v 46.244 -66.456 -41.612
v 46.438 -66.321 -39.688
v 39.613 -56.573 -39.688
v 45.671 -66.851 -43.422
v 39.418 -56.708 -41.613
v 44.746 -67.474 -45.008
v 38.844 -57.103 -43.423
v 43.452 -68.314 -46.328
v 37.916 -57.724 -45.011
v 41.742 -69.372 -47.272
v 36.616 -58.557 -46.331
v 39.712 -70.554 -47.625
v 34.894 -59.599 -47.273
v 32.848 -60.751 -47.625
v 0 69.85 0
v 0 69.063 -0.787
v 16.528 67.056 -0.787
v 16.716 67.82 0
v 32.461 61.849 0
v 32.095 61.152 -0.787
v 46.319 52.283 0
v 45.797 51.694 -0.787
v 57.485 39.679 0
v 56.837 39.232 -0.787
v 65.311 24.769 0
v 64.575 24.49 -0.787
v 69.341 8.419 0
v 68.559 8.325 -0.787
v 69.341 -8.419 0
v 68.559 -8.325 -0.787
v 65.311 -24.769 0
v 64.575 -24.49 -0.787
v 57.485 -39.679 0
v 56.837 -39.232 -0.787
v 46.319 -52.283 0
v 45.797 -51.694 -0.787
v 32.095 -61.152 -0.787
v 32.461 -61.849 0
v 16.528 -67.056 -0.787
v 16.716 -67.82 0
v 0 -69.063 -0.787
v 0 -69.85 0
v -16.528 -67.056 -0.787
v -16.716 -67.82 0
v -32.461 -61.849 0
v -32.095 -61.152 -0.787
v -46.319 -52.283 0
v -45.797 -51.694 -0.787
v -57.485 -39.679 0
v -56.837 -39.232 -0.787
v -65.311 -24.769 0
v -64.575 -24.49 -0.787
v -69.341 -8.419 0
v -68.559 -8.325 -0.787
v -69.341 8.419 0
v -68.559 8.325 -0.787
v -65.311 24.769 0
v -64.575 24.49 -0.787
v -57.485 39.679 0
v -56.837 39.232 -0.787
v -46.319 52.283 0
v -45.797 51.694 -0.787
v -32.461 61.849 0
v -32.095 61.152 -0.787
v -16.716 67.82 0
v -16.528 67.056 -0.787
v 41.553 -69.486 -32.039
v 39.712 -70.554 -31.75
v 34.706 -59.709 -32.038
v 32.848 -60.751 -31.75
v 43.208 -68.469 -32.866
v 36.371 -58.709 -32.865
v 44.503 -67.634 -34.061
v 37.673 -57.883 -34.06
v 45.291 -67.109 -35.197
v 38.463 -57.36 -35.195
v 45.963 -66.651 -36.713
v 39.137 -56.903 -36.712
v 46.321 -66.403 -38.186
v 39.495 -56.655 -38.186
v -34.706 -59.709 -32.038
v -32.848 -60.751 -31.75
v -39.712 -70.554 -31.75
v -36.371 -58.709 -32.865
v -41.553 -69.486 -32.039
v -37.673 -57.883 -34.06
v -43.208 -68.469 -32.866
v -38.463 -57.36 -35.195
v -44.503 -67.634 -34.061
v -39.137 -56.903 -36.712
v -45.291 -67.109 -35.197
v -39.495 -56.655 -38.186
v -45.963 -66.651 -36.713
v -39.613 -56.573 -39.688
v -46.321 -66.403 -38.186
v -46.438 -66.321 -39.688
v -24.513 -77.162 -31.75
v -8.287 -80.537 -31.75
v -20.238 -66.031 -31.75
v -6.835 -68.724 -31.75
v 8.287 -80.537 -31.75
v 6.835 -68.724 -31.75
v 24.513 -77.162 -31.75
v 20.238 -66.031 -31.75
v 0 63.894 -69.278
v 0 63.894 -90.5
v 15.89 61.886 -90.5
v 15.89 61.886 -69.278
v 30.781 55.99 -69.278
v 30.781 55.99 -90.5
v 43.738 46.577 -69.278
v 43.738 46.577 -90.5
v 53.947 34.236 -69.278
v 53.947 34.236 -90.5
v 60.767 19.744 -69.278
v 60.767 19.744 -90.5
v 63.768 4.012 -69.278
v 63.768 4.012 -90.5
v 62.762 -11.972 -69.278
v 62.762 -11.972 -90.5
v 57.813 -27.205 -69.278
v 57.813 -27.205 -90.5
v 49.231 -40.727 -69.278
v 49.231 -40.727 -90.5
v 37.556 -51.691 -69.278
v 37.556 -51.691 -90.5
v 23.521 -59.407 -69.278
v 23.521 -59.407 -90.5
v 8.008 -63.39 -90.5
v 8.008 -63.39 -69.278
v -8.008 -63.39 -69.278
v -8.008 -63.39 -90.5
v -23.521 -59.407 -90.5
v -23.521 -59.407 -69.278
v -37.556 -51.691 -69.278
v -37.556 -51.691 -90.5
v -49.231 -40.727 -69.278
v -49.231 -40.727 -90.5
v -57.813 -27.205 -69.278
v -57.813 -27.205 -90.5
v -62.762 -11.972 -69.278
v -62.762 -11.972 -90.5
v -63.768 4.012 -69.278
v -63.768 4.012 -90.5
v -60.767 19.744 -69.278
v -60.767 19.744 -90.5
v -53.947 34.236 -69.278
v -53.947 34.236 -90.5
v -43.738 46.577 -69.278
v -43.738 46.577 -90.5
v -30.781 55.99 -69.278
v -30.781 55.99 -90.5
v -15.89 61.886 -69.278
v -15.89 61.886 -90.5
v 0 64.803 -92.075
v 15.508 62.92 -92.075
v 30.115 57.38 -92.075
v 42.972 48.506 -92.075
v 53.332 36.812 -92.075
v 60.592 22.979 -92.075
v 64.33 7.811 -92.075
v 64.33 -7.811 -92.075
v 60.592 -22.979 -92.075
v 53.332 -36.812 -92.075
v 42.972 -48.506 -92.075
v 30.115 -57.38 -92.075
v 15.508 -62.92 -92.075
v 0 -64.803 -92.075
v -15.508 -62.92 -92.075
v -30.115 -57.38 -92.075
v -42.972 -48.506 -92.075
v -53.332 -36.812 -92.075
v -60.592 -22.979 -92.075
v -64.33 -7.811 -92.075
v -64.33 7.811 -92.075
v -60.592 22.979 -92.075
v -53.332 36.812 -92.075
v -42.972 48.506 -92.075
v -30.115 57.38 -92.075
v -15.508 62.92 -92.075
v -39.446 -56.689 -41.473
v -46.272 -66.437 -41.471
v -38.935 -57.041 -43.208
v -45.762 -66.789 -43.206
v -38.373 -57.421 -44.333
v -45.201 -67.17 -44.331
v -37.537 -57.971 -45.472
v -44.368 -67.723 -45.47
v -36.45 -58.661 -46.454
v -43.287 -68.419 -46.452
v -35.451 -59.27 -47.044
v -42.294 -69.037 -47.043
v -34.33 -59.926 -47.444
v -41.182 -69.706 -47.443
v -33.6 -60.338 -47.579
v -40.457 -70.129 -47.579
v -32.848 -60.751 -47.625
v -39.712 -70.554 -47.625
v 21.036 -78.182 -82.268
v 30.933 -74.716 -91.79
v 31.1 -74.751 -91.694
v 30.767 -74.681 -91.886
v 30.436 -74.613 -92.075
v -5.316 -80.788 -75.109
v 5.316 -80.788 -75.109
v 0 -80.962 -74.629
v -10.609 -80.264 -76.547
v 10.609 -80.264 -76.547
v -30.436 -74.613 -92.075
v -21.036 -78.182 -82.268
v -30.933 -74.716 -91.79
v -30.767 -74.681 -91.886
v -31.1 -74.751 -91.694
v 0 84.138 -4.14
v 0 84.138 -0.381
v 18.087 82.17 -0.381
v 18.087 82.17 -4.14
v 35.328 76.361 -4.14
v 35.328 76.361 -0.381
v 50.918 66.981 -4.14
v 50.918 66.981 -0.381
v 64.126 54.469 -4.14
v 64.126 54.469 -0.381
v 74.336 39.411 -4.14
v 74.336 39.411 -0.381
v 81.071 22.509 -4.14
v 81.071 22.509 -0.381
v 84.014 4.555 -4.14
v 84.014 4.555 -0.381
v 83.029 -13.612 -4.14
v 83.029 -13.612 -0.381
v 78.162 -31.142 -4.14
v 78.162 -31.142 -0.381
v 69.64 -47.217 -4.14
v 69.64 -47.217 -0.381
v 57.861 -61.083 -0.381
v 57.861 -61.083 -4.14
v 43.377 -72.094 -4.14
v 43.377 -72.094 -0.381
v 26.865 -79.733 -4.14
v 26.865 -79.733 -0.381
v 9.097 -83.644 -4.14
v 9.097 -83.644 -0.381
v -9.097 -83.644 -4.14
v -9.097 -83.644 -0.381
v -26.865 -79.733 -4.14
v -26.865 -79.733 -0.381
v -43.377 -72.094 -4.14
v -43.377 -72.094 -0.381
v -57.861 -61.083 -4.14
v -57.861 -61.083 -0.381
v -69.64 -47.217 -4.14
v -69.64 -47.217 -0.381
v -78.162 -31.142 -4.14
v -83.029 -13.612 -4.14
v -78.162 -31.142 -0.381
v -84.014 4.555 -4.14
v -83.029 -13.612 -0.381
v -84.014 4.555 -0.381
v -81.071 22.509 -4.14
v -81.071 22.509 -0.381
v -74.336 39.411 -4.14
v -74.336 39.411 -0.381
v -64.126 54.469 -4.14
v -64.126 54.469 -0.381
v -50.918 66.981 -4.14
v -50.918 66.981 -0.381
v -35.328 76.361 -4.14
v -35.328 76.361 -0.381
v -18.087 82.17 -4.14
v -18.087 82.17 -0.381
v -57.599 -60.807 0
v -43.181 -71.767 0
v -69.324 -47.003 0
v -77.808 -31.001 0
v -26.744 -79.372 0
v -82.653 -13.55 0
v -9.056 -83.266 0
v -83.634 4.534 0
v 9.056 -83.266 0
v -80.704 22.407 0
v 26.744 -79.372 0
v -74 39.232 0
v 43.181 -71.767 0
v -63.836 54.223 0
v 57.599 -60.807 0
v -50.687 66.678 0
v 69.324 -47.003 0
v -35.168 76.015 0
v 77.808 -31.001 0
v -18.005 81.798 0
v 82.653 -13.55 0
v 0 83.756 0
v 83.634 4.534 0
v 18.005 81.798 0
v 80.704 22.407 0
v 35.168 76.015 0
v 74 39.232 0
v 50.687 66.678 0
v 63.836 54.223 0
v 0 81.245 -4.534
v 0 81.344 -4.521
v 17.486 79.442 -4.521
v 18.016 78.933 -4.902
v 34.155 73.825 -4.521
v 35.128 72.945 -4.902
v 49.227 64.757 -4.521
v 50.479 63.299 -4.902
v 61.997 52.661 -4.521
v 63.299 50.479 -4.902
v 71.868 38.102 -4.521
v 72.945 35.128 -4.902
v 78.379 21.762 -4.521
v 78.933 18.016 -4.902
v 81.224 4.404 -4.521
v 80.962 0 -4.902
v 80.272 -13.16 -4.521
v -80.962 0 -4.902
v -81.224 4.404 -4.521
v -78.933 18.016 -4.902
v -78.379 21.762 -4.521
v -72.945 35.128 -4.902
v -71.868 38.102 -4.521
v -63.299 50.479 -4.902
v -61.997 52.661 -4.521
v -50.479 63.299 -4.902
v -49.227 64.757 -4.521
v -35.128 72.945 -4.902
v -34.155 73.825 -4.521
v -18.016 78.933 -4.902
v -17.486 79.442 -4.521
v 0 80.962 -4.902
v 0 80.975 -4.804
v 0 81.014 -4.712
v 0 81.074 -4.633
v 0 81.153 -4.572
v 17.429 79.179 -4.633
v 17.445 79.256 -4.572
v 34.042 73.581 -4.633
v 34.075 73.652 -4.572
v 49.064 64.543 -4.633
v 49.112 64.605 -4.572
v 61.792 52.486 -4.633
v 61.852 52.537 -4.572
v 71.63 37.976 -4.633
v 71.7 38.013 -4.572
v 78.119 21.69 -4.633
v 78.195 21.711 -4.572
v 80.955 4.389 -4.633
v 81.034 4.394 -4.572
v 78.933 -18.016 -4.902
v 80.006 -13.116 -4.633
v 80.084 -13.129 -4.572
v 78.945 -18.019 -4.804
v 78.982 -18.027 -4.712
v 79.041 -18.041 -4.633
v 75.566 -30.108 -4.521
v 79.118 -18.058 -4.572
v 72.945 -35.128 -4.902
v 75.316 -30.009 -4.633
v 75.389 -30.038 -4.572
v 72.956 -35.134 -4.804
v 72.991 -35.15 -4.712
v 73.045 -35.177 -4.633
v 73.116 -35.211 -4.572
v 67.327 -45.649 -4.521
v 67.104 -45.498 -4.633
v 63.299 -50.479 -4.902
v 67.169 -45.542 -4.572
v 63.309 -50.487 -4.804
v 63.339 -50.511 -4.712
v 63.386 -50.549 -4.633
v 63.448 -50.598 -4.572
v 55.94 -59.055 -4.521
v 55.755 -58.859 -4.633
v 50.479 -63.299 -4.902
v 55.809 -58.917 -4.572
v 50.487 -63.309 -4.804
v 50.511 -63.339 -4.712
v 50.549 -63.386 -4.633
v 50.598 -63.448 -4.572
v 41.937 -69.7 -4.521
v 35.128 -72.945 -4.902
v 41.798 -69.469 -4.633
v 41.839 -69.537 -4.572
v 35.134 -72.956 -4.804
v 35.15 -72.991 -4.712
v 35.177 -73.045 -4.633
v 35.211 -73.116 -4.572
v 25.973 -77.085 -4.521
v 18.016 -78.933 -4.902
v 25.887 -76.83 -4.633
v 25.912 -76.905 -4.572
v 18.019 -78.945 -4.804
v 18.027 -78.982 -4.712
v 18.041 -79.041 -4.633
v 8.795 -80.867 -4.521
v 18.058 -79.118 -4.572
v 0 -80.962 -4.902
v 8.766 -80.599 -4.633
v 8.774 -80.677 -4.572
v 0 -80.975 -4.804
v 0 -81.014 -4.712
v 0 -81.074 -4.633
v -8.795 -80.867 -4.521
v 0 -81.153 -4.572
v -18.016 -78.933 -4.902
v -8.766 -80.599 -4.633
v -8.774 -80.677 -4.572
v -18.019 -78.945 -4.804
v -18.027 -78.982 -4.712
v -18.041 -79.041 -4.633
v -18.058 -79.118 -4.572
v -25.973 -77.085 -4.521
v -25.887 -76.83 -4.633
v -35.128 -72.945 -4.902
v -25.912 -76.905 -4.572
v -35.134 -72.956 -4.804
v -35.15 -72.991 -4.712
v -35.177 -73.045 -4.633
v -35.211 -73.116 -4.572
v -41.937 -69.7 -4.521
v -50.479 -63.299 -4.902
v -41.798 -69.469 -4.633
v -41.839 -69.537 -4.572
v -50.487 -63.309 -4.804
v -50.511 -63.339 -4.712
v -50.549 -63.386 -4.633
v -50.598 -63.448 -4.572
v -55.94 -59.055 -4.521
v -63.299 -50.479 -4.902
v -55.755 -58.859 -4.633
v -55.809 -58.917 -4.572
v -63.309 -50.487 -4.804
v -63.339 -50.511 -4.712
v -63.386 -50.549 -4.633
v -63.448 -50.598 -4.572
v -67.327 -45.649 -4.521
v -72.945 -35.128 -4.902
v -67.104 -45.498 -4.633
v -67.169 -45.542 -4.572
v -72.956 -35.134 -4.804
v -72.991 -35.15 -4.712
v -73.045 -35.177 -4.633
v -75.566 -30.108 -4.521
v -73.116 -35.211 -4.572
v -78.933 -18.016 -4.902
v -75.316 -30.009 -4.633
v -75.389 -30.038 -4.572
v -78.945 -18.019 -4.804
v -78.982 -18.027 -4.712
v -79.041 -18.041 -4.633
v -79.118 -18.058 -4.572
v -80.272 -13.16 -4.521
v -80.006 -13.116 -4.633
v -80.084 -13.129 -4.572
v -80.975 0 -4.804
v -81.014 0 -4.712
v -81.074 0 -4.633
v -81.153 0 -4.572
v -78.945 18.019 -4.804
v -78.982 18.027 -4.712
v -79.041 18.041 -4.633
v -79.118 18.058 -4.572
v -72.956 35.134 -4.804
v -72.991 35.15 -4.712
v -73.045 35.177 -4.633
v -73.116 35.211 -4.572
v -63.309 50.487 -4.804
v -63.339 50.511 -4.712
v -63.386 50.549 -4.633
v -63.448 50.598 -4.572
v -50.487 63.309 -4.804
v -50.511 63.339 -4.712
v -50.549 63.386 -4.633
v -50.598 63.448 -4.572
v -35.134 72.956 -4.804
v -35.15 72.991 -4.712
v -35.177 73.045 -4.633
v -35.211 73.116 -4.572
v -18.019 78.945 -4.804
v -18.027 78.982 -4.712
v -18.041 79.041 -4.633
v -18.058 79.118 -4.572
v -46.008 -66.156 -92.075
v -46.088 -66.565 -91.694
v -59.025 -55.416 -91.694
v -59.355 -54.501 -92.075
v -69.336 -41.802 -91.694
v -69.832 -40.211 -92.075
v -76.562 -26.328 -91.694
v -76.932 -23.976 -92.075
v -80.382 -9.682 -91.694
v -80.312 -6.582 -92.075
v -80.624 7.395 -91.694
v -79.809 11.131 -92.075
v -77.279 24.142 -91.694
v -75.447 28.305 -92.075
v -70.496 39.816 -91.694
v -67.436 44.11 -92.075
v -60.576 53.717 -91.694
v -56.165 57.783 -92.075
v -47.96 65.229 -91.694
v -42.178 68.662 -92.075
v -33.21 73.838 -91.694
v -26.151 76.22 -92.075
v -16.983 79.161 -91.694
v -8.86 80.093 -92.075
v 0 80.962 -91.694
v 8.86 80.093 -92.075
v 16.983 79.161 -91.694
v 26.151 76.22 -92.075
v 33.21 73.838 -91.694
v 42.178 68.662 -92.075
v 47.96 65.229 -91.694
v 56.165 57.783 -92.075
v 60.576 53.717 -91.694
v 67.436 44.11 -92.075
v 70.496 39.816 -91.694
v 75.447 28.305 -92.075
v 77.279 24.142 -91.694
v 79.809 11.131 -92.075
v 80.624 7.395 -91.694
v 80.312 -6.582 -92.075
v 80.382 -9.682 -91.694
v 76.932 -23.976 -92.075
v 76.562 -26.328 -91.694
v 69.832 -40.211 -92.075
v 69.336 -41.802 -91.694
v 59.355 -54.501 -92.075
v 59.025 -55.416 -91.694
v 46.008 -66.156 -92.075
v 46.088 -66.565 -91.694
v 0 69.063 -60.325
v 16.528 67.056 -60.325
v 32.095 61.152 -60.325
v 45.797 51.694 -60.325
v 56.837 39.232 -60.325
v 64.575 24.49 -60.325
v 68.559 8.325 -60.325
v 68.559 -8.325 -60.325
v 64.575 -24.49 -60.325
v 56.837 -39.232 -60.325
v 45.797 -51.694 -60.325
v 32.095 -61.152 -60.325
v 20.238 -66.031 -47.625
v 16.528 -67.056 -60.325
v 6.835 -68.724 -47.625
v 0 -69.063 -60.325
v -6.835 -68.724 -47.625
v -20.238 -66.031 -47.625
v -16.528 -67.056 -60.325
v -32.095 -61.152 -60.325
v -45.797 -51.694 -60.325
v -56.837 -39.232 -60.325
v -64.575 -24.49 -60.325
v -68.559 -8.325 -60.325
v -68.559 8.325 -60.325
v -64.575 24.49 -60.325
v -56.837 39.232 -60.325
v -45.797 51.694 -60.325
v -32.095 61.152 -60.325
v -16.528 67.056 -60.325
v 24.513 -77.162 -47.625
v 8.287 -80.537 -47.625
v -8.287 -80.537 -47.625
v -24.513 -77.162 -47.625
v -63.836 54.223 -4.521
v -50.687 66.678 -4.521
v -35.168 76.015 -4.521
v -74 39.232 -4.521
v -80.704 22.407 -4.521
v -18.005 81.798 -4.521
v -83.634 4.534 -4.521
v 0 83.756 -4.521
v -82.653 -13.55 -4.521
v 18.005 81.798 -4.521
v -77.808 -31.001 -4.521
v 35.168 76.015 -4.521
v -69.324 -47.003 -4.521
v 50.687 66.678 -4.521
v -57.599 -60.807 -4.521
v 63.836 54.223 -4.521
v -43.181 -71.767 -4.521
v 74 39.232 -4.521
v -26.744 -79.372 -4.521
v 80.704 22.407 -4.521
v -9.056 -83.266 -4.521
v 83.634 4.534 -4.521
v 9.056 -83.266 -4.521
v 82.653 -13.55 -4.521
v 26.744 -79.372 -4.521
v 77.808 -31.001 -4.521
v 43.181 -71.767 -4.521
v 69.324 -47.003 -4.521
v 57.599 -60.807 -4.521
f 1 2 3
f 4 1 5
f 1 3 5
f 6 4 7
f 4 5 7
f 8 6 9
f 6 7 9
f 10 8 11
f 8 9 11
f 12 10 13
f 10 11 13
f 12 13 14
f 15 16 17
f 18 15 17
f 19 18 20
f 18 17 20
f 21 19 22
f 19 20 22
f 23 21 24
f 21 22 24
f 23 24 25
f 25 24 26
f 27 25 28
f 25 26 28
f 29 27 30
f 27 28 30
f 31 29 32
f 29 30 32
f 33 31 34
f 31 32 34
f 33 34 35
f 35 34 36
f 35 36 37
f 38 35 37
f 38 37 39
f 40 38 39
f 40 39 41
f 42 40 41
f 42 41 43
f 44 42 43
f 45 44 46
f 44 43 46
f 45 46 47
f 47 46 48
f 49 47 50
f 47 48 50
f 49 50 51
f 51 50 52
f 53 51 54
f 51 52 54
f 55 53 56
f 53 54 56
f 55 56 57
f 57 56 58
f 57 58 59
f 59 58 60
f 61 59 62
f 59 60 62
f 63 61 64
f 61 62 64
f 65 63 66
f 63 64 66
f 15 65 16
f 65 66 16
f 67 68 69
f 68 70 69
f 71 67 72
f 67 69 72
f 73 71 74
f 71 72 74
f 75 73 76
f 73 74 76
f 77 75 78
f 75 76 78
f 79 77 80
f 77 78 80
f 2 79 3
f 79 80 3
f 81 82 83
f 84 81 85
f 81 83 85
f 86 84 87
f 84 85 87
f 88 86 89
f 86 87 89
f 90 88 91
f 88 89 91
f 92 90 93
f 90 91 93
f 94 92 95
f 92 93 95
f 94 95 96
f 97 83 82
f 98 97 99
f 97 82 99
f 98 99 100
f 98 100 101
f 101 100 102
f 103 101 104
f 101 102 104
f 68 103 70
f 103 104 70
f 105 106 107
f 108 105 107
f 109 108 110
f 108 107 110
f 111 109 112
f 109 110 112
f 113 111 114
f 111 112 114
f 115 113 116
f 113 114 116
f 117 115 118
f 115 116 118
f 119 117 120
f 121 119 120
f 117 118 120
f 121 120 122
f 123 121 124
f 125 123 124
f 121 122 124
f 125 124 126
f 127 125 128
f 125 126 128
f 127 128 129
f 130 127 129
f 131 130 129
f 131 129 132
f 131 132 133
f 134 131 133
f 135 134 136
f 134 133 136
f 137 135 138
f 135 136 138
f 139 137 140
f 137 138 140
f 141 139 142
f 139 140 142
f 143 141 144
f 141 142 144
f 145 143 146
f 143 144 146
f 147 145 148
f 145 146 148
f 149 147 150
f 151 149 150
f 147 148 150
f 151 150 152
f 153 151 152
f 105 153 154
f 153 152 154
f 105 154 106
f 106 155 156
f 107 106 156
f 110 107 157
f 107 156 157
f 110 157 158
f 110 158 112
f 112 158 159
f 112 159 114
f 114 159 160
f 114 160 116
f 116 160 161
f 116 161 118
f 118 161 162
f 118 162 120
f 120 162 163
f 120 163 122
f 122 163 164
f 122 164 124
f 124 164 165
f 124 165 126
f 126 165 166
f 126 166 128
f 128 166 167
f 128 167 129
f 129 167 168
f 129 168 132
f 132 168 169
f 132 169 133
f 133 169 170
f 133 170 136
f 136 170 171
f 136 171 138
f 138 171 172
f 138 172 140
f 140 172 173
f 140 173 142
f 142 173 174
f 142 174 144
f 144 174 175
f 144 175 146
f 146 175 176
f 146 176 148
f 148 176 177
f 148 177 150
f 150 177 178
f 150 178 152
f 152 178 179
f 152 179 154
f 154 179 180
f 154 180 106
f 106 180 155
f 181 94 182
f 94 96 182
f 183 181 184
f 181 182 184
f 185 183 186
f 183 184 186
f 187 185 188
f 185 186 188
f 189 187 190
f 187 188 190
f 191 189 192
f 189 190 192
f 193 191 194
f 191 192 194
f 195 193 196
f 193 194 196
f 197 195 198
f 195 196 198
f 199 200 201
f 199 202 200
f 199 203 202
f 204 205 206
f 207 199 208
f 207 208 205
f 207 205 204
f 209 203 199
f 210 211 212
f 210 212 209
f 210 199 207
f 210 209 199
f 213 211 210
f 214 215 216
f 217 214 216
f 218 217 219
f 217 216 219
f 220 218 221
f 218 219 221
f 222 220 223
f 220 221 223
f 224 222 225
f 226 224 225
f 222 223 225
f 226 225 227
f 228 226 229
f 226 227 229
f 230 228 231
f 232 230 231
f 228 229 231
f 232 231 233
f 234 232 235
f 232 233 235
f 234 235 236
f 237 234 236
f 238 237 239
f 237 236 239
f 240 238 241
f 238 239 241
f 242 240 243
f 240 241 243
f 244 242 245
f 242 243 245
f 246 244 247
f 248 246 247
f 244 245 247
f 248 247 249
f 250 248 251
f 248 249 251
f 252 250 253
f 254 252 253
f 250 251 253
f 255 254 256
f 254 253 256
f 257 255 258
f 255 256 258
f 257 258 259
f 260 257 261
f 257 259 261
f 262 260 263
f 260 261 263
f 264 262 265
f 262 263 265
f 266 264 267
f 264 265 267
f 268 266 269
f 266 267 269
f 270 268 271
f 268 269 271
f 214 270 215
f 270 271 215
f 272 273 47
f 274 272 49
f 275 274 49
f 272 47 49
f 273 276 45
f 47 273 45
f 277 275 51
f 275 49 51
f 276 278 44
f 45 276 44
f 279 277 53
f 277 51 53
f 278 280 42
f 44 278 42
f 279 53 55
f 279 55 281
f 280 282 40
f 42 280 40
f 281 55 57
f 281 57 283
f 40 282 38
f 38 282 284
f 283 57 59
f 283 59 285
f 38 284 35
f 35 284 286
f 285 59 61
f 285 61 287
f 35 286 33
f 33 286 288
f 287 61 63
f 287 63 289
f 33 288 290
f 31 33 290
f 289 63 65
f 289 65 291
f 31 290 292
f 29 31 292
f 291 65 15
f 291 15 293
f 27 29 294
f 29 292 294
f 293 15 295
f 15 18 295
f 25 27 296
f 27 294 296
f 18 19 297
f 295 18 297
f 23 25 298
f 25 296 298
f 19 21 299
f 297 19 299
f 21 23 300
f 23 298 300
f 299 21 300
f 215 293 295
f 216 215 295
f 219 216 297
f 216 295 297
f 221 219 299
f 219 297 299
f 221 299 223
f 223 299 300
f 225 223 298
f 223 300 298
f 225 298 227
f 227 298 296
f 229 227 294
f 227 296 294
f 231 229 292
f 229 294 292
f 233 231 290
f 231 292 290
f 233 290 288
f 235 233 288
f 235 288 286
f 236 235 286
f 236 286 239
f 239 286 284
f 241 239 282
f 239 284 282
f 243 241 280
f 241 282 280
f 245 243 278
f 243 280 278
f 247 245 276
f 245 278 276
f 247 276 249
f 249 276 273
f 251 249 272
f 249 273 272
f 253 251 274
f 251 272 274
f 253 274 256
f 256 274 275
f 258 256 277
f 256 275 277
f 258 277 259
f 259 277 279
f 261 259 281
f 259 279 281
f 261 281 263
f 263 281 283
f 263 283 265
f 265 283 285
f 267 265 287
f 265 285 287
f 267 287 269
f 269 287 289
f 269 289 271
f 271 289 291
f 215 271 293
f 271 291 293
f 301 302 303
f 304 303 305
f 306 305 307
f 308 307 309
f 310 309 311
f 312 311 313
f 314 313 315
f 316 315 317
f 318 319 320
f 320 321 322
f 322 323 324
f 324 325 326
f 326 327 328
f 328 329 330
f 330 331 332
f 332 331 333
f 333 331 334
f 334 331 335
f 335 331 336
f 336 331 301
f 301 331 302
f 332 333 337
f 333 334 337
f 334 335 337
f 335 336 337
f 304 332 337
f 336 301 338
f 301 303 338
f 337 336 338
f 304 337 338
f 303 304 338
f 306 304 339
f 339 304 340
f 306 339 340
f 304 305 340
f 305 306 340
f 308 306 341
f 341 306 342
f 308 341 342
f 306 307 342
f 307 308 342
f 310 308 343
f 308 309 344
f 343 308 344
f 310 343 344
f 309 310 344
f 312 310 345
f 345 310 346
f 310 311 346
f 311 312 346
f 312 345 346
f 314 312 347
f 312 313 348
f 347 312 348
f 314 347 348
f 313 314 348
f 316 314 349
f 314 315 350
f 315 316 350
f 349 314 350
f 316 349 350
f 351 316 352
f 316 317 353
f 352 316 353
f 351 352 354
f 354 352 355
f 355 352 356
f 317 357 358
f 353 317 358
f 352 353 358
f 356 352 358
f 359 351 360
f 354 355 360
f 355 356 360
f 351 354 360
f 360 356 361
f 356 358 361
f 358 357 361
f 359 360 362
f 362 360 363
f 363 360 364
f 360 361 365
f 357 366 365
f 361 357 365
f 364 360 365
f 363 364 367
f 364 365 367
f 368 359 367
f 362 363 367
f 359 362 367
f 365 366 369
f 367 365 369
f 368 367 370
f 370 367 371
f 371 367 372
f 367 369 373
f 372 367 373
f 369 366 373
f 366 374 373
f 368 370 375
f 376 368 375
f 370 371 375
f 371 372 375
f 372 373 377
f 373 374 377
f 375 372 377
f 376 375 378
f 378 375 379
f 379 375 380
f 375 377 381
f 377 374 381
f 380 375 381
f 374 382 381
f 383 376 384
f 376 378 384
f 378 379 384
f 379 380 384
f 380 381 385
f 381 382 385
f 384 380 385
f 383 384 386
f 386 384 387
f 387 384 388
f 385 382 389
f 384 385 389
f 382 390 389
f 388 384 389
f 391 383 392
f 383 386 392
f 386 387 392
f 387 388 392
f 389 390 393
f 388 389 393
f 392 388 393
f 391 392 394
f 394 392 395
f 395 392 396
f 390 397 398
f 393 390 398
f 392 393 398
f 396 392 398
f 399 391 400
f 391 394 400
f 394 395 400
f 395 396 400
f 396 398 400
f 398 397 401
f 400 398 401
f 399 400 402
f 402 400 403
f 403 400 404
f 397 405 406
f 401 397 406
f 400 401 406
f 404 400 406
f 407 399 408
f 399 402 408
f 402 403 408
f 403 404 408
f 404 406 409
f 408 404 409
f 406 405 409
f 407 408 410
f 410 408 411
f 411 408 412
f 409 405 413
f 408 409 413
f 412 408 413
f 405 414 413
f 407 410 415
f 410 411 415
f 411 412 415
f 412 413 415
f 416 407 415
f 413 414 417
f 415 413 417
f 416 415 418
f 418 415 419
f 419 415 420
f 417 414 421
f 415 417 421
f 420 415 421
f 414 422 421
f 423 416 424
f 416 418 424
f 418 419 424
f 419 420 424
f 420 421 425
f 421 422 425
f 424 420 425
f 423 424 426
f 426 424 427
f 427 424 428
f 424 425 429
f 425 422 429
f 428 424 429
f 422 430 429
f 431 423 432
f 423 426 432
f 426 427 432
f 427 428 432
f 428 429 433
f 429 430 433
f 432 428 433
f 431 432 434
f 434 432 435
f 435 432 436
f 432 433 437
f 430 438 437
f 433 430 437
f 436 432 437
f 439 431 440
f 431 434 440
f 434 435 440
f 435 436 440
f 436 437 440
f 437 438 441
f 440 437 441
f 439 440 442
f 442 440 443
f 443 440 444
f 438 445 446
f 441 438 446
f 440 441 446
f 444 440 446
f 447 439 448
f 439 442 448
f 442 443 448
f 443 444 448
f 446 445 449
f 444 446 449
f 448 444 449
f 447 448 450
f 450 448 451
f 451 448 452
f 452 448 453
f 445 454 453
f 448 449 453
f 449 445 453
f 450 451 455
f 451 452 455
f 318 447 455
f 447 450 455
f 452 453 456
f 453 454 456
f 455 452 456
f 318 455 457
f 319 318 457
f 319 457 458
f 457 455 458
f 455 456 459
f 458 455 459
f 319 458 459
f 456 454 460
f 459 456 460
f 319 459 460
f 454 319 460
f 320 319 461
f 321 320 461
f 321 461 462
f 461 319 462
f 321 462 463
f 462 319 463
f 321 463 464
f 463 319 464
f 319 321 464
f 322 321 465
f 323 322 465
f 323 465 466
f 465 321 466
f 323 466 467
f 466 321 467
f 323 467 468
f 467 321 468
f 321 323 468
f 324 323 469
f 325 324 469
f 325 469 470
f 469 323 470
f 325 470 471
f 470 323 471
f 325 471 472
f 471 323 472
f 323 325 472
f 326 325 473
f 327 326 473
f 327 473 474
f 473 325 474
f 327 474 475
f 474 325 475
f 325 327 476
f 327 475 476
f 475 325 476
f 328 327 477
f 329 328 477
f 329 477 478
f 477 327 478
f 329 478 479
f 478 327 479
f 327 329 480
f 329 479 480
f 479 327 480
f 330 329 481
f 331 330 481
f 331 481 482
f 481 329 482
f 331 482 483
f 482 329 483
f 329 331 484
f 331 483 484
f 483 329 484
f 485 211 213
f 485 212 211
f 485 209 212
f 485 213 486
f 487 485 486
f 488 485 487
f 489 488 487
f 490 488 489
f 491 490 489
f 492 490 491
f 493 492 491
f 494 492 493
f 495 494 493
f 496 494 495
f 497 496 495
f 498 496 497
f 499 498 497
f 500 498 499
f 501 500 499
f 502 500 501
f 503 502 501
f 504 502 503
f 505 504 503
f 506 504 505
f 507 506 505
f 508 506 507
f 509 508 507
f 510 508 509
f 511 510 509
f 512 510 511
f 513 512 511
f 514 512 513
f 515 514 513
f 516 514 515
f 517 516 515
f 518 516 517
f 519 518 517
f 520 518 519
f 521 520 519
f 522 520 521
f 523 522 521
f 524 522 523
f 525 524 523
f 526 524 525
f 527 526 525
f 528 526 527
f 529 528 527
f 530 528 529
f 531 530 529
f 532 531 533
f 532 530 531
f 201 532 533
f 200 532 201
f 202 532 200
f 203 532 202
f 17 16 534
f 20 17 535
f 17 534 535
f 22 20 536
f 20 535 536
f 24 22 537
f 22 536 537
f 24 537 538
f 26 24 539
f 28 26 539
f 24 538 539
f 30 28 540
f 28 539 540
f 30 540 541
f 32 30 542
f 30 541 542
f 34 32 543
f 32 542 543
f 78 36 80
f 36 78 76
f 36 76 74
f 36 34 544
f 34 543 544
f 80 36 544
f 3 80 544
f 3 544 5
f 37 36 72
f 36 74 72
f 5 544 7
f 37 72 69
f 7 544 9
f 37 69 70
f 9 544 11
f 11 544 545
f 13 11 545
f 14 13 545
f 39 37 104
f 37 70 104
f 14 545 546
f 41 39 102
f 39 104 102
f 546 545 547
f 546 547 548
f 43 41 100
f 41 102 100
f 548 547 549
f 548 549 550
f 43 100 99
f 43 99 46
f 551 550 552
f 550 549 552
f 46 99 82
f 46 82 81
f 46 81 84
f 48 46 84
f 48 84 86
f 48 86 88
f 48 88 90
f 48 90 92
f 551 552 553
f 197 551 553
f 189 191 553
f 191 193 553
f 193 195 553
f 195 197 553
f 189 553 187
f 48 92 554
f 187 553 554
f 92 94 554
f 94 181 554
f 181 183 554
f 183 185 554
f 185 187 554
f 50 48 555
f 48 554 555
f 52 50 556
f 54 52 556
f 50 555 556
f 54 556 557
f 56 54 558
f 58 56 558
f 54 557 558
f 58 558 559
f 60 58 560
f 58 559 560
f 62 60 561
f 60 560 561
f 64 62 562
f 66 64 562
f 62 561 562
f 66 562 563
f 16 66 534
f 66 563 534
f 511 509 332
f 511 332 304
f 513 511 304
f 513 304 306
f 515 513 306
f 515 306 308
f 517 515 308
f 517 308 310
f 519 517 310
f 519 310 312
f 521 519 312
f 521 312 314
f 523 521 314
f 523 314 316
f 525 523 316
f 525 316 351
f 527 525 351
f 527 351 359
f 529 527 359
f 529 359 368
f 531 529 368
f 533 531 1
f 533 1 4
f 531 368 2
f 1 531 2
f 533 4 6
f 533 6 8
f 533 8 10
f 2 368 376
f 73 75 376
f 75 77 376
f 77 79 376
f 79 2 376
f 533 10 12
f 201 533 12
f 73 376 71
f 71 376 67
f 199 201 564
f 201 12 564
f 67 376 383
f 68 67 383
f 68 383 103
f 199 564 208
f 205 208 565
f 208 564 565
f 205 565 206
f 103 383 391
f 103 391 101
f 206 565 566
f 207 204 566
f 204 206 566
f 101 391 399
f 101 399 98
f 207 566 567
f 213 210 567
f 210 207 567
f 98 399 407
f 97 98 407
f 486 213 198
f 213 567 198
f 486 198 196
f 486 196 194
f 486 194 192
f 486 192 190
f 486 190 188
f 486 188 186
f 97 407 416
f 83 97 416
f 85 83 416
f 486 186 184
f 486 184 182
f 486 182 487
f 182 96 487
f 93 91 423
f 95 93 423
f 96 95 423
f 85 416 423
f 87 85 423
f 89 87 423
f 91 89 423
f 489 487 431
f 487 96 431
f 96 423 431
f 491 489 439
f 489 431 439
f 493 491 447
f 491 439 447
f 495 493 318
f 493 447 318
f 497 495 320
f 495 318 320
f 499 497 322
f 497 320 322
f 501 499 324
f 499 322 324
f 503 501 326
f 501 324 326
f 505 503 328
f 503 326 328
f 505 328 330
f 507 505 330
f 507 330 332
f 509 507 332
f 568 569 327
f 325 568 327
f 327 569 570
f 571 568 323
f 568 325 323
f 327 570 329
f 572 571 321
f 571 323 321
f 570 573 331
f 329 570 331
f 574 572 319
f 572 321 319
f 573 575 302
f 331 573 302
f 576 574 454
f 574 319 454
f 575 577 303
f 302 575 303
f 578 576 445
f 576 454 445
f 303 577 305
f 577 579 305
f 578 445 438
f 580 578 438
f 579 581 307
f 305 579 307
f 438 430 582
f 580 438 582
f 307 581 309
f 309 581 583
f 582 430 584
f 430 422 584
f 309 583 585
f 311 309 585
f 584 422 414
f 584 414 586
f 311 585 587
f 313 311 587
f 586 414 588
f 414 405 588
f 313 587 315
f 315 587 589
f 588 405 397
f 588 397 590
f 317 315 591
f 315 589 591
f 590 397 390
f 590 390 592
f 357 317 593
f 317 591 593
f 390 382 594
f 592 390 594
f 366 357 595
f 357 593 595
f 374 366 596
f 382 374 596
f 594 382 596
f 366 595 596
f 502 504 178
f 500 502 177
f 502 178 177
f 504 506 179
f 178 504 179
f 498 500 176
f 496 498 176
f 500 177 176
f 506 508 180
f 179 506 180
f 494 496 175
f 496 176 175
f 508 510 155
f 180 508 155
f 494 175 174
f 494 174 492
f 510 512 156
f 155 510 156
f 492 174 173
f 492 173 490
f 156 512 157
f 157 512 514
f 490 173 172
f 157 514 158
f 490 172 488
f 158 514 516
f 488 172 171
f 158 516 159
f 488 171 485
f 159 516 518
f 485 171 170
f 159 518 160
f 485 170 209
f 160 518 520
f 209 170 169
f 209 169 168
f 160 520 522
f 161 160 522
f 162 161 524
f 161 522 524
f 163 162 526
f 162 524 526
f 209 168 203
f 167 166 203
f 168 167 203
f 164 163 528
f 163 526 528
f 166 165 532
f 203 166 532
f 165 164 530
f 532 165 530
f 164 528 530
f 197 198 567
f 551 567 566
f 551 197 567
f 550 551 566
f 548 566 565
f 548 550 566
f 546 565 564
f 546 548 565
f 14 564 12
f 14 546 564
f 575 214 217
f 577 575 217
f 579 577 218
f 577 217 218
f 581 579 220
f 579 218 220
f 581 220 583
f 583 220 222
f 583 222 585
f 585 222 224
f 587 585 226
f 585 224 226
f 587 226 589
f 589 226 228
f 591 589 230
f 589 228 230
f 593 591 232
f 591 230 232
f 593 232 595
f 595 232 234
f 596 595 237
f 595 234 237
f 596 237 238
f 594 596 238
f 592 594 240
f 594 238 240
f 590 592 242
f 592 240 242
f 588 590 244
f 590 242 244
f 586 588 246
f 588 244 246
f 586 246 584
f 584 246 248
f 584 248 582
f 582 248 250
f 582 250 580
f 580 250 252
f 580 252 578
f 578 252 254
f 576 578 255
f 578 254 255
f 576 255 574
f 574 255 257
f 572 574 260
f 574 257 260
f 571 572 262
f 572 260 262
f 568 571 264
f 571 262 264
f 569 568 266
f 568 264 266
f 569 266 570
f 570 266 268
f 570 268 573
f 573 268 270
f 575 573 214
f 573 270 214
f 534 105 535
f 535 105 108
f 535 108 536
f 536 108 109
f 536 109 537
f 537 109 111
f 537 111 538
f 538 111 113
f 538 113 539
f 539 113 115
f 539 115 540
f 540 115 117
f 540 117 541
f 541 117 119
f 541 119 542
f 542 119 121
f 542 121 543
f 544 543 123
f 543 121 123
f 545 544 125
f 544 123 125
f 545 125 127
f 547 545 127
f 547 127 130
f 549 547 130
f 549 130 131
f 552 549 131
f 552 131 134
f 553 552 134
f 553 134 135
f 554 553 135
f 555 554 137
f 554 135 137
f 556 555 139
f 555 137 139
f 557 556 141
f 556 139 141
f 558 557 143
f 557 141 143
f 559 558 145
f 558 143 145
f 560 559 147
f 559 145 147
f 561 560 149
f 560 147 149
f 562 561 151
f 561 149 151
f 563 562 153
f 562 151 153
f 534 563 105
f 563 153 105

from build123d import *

# Parameters (mm, degrees)
F2_R          = 0.381
F3_SIZE       = 0.381
F4_SIZE       = 0.7874
F5_SIZE2      = 0.9092112039
F5_SIZE       = 1.5748
F7_DEPTH      = 84.1385
F7_DEPTH_BACK = 84.1385
F8_SIZE       = 0.381
F11_DEPTH     = 15.875
F12_R         = 7.9375
F13_R         = 7.93749


# Not quite as in the source:
# - a fillet or chamfer is up to 0.001 mm smaller than in the source, because OpenCascade refuses the exact size


with BuildPart() as f1:
    # F0 (on Right) → F1 (revolve)
    with BuildSketch(Plane.YZ):
        Polygon((84.1375, -4.5212), (84.1375, 0), (69.0626, 0), (69.0626, -60.325), (63.8937, -69.2777974192), (63.8937, -92.075), (80.9625, -92.075), (80.9625, -4.5212), align=None)
    revolve(axis=Axis((0, 0, -46.0375), (0, 0, -1)))

    # F2
    f2_edges = [f1.edges().sort_by_distance(p)[0] for p in [
        (0, -80.9625, -4.5212),
    ]]
    fillet(f2_edges, radius=F2_R)

    # F3
    f3_edges = [f1.edges().sort_by_distance(p)[0] for p in [
        (0, -84.1375, -4.5212),
        (0, -84.1375, 0),
        (0, 84.1375, -2.2606),
    ]]
    chamfer(f3_edges, length=F3_SIZE)

    # F4
    f4_edges = [f1.edges().sort_by_distance(p)[0] for p in [
        (0, -69.0626, 0),
    ]]
    chamfer(f4_edges, length=F4_SIZE)

    # F5
    f5_edges = [f1.edges().sort_by_distance(p)[0] for p in [
        (0, -63.8937, -92.075),
    ]]
    chamfer(f5_edges, length=F5_SIZE, length2=F5_SIZE2)

    # F6 (on Right) → F7 (cut, two sides)
    with BuildSketch(Plane.YZ) as f7_sk:
        Polygon((-80.9625, -74.6285183865), (-80.9625, -92.075), (-74.6125, -92.075), align=None)
    extrude(amount=F7_DEPTH, mode=Mode.SUBTRACT)
    extrude(f7_sk.sketch, amount=-F7_DEPTH_BACK, mode=Mode.SUBTRACT)

    # F8
    f8_edges = [f1.edges().sort_by_distance(p)[0] for p in [
        (79.359123, 16.032964, -92.075),
    ]]
    chamfer(f8_edges, length=F8_SIZE)

    # F10 (on offset) → F11 (cut)
    with BuildSketch(Plane.XY.offset(-31.75)):
        with BuildLine():
            Line((-39.6126799931, -56.5727699739), (-46.4381822281, -66.3205973857))
            ThreePointArc((-46.4381822281, -66.3205973857), (0, -80.9625), (46.4381822281, -66.3205973857))
            Line((46.4381822281, -66.3205973857), (39.6126799931, -56.5727699739))
            ThreePointArc((39.6126799931, -56.5727699739), (0, -69.0626), (-39.6126799931, -56.5727699739))
        make_face()
    extrude(amount=-F11_DEPTH, mode=Mode.SUBTRACT)

    # F12
    f12_edges = [f1.edges().sort_by_distance(p)[0] for p in [
        (-43.025431, -61.446684, -31.75),
        (43.025431, -61.446684, -31.75),
    ]]
    fillet(f12_edges, radius=F12_R)

    # F13 (radius 7.9375 in the source; OpenCascade refuses exactly that, so slightly less here)
    f13_edges = [f1.edges().sort_by_distance(p)[0] for p in [
        (-43.025431, -61.446684, -47.625),
        (43.025431, -61.446684, -47.625),
    ]]
    fillet(f13_edges, radius=F13_R)


solid = f1.part
